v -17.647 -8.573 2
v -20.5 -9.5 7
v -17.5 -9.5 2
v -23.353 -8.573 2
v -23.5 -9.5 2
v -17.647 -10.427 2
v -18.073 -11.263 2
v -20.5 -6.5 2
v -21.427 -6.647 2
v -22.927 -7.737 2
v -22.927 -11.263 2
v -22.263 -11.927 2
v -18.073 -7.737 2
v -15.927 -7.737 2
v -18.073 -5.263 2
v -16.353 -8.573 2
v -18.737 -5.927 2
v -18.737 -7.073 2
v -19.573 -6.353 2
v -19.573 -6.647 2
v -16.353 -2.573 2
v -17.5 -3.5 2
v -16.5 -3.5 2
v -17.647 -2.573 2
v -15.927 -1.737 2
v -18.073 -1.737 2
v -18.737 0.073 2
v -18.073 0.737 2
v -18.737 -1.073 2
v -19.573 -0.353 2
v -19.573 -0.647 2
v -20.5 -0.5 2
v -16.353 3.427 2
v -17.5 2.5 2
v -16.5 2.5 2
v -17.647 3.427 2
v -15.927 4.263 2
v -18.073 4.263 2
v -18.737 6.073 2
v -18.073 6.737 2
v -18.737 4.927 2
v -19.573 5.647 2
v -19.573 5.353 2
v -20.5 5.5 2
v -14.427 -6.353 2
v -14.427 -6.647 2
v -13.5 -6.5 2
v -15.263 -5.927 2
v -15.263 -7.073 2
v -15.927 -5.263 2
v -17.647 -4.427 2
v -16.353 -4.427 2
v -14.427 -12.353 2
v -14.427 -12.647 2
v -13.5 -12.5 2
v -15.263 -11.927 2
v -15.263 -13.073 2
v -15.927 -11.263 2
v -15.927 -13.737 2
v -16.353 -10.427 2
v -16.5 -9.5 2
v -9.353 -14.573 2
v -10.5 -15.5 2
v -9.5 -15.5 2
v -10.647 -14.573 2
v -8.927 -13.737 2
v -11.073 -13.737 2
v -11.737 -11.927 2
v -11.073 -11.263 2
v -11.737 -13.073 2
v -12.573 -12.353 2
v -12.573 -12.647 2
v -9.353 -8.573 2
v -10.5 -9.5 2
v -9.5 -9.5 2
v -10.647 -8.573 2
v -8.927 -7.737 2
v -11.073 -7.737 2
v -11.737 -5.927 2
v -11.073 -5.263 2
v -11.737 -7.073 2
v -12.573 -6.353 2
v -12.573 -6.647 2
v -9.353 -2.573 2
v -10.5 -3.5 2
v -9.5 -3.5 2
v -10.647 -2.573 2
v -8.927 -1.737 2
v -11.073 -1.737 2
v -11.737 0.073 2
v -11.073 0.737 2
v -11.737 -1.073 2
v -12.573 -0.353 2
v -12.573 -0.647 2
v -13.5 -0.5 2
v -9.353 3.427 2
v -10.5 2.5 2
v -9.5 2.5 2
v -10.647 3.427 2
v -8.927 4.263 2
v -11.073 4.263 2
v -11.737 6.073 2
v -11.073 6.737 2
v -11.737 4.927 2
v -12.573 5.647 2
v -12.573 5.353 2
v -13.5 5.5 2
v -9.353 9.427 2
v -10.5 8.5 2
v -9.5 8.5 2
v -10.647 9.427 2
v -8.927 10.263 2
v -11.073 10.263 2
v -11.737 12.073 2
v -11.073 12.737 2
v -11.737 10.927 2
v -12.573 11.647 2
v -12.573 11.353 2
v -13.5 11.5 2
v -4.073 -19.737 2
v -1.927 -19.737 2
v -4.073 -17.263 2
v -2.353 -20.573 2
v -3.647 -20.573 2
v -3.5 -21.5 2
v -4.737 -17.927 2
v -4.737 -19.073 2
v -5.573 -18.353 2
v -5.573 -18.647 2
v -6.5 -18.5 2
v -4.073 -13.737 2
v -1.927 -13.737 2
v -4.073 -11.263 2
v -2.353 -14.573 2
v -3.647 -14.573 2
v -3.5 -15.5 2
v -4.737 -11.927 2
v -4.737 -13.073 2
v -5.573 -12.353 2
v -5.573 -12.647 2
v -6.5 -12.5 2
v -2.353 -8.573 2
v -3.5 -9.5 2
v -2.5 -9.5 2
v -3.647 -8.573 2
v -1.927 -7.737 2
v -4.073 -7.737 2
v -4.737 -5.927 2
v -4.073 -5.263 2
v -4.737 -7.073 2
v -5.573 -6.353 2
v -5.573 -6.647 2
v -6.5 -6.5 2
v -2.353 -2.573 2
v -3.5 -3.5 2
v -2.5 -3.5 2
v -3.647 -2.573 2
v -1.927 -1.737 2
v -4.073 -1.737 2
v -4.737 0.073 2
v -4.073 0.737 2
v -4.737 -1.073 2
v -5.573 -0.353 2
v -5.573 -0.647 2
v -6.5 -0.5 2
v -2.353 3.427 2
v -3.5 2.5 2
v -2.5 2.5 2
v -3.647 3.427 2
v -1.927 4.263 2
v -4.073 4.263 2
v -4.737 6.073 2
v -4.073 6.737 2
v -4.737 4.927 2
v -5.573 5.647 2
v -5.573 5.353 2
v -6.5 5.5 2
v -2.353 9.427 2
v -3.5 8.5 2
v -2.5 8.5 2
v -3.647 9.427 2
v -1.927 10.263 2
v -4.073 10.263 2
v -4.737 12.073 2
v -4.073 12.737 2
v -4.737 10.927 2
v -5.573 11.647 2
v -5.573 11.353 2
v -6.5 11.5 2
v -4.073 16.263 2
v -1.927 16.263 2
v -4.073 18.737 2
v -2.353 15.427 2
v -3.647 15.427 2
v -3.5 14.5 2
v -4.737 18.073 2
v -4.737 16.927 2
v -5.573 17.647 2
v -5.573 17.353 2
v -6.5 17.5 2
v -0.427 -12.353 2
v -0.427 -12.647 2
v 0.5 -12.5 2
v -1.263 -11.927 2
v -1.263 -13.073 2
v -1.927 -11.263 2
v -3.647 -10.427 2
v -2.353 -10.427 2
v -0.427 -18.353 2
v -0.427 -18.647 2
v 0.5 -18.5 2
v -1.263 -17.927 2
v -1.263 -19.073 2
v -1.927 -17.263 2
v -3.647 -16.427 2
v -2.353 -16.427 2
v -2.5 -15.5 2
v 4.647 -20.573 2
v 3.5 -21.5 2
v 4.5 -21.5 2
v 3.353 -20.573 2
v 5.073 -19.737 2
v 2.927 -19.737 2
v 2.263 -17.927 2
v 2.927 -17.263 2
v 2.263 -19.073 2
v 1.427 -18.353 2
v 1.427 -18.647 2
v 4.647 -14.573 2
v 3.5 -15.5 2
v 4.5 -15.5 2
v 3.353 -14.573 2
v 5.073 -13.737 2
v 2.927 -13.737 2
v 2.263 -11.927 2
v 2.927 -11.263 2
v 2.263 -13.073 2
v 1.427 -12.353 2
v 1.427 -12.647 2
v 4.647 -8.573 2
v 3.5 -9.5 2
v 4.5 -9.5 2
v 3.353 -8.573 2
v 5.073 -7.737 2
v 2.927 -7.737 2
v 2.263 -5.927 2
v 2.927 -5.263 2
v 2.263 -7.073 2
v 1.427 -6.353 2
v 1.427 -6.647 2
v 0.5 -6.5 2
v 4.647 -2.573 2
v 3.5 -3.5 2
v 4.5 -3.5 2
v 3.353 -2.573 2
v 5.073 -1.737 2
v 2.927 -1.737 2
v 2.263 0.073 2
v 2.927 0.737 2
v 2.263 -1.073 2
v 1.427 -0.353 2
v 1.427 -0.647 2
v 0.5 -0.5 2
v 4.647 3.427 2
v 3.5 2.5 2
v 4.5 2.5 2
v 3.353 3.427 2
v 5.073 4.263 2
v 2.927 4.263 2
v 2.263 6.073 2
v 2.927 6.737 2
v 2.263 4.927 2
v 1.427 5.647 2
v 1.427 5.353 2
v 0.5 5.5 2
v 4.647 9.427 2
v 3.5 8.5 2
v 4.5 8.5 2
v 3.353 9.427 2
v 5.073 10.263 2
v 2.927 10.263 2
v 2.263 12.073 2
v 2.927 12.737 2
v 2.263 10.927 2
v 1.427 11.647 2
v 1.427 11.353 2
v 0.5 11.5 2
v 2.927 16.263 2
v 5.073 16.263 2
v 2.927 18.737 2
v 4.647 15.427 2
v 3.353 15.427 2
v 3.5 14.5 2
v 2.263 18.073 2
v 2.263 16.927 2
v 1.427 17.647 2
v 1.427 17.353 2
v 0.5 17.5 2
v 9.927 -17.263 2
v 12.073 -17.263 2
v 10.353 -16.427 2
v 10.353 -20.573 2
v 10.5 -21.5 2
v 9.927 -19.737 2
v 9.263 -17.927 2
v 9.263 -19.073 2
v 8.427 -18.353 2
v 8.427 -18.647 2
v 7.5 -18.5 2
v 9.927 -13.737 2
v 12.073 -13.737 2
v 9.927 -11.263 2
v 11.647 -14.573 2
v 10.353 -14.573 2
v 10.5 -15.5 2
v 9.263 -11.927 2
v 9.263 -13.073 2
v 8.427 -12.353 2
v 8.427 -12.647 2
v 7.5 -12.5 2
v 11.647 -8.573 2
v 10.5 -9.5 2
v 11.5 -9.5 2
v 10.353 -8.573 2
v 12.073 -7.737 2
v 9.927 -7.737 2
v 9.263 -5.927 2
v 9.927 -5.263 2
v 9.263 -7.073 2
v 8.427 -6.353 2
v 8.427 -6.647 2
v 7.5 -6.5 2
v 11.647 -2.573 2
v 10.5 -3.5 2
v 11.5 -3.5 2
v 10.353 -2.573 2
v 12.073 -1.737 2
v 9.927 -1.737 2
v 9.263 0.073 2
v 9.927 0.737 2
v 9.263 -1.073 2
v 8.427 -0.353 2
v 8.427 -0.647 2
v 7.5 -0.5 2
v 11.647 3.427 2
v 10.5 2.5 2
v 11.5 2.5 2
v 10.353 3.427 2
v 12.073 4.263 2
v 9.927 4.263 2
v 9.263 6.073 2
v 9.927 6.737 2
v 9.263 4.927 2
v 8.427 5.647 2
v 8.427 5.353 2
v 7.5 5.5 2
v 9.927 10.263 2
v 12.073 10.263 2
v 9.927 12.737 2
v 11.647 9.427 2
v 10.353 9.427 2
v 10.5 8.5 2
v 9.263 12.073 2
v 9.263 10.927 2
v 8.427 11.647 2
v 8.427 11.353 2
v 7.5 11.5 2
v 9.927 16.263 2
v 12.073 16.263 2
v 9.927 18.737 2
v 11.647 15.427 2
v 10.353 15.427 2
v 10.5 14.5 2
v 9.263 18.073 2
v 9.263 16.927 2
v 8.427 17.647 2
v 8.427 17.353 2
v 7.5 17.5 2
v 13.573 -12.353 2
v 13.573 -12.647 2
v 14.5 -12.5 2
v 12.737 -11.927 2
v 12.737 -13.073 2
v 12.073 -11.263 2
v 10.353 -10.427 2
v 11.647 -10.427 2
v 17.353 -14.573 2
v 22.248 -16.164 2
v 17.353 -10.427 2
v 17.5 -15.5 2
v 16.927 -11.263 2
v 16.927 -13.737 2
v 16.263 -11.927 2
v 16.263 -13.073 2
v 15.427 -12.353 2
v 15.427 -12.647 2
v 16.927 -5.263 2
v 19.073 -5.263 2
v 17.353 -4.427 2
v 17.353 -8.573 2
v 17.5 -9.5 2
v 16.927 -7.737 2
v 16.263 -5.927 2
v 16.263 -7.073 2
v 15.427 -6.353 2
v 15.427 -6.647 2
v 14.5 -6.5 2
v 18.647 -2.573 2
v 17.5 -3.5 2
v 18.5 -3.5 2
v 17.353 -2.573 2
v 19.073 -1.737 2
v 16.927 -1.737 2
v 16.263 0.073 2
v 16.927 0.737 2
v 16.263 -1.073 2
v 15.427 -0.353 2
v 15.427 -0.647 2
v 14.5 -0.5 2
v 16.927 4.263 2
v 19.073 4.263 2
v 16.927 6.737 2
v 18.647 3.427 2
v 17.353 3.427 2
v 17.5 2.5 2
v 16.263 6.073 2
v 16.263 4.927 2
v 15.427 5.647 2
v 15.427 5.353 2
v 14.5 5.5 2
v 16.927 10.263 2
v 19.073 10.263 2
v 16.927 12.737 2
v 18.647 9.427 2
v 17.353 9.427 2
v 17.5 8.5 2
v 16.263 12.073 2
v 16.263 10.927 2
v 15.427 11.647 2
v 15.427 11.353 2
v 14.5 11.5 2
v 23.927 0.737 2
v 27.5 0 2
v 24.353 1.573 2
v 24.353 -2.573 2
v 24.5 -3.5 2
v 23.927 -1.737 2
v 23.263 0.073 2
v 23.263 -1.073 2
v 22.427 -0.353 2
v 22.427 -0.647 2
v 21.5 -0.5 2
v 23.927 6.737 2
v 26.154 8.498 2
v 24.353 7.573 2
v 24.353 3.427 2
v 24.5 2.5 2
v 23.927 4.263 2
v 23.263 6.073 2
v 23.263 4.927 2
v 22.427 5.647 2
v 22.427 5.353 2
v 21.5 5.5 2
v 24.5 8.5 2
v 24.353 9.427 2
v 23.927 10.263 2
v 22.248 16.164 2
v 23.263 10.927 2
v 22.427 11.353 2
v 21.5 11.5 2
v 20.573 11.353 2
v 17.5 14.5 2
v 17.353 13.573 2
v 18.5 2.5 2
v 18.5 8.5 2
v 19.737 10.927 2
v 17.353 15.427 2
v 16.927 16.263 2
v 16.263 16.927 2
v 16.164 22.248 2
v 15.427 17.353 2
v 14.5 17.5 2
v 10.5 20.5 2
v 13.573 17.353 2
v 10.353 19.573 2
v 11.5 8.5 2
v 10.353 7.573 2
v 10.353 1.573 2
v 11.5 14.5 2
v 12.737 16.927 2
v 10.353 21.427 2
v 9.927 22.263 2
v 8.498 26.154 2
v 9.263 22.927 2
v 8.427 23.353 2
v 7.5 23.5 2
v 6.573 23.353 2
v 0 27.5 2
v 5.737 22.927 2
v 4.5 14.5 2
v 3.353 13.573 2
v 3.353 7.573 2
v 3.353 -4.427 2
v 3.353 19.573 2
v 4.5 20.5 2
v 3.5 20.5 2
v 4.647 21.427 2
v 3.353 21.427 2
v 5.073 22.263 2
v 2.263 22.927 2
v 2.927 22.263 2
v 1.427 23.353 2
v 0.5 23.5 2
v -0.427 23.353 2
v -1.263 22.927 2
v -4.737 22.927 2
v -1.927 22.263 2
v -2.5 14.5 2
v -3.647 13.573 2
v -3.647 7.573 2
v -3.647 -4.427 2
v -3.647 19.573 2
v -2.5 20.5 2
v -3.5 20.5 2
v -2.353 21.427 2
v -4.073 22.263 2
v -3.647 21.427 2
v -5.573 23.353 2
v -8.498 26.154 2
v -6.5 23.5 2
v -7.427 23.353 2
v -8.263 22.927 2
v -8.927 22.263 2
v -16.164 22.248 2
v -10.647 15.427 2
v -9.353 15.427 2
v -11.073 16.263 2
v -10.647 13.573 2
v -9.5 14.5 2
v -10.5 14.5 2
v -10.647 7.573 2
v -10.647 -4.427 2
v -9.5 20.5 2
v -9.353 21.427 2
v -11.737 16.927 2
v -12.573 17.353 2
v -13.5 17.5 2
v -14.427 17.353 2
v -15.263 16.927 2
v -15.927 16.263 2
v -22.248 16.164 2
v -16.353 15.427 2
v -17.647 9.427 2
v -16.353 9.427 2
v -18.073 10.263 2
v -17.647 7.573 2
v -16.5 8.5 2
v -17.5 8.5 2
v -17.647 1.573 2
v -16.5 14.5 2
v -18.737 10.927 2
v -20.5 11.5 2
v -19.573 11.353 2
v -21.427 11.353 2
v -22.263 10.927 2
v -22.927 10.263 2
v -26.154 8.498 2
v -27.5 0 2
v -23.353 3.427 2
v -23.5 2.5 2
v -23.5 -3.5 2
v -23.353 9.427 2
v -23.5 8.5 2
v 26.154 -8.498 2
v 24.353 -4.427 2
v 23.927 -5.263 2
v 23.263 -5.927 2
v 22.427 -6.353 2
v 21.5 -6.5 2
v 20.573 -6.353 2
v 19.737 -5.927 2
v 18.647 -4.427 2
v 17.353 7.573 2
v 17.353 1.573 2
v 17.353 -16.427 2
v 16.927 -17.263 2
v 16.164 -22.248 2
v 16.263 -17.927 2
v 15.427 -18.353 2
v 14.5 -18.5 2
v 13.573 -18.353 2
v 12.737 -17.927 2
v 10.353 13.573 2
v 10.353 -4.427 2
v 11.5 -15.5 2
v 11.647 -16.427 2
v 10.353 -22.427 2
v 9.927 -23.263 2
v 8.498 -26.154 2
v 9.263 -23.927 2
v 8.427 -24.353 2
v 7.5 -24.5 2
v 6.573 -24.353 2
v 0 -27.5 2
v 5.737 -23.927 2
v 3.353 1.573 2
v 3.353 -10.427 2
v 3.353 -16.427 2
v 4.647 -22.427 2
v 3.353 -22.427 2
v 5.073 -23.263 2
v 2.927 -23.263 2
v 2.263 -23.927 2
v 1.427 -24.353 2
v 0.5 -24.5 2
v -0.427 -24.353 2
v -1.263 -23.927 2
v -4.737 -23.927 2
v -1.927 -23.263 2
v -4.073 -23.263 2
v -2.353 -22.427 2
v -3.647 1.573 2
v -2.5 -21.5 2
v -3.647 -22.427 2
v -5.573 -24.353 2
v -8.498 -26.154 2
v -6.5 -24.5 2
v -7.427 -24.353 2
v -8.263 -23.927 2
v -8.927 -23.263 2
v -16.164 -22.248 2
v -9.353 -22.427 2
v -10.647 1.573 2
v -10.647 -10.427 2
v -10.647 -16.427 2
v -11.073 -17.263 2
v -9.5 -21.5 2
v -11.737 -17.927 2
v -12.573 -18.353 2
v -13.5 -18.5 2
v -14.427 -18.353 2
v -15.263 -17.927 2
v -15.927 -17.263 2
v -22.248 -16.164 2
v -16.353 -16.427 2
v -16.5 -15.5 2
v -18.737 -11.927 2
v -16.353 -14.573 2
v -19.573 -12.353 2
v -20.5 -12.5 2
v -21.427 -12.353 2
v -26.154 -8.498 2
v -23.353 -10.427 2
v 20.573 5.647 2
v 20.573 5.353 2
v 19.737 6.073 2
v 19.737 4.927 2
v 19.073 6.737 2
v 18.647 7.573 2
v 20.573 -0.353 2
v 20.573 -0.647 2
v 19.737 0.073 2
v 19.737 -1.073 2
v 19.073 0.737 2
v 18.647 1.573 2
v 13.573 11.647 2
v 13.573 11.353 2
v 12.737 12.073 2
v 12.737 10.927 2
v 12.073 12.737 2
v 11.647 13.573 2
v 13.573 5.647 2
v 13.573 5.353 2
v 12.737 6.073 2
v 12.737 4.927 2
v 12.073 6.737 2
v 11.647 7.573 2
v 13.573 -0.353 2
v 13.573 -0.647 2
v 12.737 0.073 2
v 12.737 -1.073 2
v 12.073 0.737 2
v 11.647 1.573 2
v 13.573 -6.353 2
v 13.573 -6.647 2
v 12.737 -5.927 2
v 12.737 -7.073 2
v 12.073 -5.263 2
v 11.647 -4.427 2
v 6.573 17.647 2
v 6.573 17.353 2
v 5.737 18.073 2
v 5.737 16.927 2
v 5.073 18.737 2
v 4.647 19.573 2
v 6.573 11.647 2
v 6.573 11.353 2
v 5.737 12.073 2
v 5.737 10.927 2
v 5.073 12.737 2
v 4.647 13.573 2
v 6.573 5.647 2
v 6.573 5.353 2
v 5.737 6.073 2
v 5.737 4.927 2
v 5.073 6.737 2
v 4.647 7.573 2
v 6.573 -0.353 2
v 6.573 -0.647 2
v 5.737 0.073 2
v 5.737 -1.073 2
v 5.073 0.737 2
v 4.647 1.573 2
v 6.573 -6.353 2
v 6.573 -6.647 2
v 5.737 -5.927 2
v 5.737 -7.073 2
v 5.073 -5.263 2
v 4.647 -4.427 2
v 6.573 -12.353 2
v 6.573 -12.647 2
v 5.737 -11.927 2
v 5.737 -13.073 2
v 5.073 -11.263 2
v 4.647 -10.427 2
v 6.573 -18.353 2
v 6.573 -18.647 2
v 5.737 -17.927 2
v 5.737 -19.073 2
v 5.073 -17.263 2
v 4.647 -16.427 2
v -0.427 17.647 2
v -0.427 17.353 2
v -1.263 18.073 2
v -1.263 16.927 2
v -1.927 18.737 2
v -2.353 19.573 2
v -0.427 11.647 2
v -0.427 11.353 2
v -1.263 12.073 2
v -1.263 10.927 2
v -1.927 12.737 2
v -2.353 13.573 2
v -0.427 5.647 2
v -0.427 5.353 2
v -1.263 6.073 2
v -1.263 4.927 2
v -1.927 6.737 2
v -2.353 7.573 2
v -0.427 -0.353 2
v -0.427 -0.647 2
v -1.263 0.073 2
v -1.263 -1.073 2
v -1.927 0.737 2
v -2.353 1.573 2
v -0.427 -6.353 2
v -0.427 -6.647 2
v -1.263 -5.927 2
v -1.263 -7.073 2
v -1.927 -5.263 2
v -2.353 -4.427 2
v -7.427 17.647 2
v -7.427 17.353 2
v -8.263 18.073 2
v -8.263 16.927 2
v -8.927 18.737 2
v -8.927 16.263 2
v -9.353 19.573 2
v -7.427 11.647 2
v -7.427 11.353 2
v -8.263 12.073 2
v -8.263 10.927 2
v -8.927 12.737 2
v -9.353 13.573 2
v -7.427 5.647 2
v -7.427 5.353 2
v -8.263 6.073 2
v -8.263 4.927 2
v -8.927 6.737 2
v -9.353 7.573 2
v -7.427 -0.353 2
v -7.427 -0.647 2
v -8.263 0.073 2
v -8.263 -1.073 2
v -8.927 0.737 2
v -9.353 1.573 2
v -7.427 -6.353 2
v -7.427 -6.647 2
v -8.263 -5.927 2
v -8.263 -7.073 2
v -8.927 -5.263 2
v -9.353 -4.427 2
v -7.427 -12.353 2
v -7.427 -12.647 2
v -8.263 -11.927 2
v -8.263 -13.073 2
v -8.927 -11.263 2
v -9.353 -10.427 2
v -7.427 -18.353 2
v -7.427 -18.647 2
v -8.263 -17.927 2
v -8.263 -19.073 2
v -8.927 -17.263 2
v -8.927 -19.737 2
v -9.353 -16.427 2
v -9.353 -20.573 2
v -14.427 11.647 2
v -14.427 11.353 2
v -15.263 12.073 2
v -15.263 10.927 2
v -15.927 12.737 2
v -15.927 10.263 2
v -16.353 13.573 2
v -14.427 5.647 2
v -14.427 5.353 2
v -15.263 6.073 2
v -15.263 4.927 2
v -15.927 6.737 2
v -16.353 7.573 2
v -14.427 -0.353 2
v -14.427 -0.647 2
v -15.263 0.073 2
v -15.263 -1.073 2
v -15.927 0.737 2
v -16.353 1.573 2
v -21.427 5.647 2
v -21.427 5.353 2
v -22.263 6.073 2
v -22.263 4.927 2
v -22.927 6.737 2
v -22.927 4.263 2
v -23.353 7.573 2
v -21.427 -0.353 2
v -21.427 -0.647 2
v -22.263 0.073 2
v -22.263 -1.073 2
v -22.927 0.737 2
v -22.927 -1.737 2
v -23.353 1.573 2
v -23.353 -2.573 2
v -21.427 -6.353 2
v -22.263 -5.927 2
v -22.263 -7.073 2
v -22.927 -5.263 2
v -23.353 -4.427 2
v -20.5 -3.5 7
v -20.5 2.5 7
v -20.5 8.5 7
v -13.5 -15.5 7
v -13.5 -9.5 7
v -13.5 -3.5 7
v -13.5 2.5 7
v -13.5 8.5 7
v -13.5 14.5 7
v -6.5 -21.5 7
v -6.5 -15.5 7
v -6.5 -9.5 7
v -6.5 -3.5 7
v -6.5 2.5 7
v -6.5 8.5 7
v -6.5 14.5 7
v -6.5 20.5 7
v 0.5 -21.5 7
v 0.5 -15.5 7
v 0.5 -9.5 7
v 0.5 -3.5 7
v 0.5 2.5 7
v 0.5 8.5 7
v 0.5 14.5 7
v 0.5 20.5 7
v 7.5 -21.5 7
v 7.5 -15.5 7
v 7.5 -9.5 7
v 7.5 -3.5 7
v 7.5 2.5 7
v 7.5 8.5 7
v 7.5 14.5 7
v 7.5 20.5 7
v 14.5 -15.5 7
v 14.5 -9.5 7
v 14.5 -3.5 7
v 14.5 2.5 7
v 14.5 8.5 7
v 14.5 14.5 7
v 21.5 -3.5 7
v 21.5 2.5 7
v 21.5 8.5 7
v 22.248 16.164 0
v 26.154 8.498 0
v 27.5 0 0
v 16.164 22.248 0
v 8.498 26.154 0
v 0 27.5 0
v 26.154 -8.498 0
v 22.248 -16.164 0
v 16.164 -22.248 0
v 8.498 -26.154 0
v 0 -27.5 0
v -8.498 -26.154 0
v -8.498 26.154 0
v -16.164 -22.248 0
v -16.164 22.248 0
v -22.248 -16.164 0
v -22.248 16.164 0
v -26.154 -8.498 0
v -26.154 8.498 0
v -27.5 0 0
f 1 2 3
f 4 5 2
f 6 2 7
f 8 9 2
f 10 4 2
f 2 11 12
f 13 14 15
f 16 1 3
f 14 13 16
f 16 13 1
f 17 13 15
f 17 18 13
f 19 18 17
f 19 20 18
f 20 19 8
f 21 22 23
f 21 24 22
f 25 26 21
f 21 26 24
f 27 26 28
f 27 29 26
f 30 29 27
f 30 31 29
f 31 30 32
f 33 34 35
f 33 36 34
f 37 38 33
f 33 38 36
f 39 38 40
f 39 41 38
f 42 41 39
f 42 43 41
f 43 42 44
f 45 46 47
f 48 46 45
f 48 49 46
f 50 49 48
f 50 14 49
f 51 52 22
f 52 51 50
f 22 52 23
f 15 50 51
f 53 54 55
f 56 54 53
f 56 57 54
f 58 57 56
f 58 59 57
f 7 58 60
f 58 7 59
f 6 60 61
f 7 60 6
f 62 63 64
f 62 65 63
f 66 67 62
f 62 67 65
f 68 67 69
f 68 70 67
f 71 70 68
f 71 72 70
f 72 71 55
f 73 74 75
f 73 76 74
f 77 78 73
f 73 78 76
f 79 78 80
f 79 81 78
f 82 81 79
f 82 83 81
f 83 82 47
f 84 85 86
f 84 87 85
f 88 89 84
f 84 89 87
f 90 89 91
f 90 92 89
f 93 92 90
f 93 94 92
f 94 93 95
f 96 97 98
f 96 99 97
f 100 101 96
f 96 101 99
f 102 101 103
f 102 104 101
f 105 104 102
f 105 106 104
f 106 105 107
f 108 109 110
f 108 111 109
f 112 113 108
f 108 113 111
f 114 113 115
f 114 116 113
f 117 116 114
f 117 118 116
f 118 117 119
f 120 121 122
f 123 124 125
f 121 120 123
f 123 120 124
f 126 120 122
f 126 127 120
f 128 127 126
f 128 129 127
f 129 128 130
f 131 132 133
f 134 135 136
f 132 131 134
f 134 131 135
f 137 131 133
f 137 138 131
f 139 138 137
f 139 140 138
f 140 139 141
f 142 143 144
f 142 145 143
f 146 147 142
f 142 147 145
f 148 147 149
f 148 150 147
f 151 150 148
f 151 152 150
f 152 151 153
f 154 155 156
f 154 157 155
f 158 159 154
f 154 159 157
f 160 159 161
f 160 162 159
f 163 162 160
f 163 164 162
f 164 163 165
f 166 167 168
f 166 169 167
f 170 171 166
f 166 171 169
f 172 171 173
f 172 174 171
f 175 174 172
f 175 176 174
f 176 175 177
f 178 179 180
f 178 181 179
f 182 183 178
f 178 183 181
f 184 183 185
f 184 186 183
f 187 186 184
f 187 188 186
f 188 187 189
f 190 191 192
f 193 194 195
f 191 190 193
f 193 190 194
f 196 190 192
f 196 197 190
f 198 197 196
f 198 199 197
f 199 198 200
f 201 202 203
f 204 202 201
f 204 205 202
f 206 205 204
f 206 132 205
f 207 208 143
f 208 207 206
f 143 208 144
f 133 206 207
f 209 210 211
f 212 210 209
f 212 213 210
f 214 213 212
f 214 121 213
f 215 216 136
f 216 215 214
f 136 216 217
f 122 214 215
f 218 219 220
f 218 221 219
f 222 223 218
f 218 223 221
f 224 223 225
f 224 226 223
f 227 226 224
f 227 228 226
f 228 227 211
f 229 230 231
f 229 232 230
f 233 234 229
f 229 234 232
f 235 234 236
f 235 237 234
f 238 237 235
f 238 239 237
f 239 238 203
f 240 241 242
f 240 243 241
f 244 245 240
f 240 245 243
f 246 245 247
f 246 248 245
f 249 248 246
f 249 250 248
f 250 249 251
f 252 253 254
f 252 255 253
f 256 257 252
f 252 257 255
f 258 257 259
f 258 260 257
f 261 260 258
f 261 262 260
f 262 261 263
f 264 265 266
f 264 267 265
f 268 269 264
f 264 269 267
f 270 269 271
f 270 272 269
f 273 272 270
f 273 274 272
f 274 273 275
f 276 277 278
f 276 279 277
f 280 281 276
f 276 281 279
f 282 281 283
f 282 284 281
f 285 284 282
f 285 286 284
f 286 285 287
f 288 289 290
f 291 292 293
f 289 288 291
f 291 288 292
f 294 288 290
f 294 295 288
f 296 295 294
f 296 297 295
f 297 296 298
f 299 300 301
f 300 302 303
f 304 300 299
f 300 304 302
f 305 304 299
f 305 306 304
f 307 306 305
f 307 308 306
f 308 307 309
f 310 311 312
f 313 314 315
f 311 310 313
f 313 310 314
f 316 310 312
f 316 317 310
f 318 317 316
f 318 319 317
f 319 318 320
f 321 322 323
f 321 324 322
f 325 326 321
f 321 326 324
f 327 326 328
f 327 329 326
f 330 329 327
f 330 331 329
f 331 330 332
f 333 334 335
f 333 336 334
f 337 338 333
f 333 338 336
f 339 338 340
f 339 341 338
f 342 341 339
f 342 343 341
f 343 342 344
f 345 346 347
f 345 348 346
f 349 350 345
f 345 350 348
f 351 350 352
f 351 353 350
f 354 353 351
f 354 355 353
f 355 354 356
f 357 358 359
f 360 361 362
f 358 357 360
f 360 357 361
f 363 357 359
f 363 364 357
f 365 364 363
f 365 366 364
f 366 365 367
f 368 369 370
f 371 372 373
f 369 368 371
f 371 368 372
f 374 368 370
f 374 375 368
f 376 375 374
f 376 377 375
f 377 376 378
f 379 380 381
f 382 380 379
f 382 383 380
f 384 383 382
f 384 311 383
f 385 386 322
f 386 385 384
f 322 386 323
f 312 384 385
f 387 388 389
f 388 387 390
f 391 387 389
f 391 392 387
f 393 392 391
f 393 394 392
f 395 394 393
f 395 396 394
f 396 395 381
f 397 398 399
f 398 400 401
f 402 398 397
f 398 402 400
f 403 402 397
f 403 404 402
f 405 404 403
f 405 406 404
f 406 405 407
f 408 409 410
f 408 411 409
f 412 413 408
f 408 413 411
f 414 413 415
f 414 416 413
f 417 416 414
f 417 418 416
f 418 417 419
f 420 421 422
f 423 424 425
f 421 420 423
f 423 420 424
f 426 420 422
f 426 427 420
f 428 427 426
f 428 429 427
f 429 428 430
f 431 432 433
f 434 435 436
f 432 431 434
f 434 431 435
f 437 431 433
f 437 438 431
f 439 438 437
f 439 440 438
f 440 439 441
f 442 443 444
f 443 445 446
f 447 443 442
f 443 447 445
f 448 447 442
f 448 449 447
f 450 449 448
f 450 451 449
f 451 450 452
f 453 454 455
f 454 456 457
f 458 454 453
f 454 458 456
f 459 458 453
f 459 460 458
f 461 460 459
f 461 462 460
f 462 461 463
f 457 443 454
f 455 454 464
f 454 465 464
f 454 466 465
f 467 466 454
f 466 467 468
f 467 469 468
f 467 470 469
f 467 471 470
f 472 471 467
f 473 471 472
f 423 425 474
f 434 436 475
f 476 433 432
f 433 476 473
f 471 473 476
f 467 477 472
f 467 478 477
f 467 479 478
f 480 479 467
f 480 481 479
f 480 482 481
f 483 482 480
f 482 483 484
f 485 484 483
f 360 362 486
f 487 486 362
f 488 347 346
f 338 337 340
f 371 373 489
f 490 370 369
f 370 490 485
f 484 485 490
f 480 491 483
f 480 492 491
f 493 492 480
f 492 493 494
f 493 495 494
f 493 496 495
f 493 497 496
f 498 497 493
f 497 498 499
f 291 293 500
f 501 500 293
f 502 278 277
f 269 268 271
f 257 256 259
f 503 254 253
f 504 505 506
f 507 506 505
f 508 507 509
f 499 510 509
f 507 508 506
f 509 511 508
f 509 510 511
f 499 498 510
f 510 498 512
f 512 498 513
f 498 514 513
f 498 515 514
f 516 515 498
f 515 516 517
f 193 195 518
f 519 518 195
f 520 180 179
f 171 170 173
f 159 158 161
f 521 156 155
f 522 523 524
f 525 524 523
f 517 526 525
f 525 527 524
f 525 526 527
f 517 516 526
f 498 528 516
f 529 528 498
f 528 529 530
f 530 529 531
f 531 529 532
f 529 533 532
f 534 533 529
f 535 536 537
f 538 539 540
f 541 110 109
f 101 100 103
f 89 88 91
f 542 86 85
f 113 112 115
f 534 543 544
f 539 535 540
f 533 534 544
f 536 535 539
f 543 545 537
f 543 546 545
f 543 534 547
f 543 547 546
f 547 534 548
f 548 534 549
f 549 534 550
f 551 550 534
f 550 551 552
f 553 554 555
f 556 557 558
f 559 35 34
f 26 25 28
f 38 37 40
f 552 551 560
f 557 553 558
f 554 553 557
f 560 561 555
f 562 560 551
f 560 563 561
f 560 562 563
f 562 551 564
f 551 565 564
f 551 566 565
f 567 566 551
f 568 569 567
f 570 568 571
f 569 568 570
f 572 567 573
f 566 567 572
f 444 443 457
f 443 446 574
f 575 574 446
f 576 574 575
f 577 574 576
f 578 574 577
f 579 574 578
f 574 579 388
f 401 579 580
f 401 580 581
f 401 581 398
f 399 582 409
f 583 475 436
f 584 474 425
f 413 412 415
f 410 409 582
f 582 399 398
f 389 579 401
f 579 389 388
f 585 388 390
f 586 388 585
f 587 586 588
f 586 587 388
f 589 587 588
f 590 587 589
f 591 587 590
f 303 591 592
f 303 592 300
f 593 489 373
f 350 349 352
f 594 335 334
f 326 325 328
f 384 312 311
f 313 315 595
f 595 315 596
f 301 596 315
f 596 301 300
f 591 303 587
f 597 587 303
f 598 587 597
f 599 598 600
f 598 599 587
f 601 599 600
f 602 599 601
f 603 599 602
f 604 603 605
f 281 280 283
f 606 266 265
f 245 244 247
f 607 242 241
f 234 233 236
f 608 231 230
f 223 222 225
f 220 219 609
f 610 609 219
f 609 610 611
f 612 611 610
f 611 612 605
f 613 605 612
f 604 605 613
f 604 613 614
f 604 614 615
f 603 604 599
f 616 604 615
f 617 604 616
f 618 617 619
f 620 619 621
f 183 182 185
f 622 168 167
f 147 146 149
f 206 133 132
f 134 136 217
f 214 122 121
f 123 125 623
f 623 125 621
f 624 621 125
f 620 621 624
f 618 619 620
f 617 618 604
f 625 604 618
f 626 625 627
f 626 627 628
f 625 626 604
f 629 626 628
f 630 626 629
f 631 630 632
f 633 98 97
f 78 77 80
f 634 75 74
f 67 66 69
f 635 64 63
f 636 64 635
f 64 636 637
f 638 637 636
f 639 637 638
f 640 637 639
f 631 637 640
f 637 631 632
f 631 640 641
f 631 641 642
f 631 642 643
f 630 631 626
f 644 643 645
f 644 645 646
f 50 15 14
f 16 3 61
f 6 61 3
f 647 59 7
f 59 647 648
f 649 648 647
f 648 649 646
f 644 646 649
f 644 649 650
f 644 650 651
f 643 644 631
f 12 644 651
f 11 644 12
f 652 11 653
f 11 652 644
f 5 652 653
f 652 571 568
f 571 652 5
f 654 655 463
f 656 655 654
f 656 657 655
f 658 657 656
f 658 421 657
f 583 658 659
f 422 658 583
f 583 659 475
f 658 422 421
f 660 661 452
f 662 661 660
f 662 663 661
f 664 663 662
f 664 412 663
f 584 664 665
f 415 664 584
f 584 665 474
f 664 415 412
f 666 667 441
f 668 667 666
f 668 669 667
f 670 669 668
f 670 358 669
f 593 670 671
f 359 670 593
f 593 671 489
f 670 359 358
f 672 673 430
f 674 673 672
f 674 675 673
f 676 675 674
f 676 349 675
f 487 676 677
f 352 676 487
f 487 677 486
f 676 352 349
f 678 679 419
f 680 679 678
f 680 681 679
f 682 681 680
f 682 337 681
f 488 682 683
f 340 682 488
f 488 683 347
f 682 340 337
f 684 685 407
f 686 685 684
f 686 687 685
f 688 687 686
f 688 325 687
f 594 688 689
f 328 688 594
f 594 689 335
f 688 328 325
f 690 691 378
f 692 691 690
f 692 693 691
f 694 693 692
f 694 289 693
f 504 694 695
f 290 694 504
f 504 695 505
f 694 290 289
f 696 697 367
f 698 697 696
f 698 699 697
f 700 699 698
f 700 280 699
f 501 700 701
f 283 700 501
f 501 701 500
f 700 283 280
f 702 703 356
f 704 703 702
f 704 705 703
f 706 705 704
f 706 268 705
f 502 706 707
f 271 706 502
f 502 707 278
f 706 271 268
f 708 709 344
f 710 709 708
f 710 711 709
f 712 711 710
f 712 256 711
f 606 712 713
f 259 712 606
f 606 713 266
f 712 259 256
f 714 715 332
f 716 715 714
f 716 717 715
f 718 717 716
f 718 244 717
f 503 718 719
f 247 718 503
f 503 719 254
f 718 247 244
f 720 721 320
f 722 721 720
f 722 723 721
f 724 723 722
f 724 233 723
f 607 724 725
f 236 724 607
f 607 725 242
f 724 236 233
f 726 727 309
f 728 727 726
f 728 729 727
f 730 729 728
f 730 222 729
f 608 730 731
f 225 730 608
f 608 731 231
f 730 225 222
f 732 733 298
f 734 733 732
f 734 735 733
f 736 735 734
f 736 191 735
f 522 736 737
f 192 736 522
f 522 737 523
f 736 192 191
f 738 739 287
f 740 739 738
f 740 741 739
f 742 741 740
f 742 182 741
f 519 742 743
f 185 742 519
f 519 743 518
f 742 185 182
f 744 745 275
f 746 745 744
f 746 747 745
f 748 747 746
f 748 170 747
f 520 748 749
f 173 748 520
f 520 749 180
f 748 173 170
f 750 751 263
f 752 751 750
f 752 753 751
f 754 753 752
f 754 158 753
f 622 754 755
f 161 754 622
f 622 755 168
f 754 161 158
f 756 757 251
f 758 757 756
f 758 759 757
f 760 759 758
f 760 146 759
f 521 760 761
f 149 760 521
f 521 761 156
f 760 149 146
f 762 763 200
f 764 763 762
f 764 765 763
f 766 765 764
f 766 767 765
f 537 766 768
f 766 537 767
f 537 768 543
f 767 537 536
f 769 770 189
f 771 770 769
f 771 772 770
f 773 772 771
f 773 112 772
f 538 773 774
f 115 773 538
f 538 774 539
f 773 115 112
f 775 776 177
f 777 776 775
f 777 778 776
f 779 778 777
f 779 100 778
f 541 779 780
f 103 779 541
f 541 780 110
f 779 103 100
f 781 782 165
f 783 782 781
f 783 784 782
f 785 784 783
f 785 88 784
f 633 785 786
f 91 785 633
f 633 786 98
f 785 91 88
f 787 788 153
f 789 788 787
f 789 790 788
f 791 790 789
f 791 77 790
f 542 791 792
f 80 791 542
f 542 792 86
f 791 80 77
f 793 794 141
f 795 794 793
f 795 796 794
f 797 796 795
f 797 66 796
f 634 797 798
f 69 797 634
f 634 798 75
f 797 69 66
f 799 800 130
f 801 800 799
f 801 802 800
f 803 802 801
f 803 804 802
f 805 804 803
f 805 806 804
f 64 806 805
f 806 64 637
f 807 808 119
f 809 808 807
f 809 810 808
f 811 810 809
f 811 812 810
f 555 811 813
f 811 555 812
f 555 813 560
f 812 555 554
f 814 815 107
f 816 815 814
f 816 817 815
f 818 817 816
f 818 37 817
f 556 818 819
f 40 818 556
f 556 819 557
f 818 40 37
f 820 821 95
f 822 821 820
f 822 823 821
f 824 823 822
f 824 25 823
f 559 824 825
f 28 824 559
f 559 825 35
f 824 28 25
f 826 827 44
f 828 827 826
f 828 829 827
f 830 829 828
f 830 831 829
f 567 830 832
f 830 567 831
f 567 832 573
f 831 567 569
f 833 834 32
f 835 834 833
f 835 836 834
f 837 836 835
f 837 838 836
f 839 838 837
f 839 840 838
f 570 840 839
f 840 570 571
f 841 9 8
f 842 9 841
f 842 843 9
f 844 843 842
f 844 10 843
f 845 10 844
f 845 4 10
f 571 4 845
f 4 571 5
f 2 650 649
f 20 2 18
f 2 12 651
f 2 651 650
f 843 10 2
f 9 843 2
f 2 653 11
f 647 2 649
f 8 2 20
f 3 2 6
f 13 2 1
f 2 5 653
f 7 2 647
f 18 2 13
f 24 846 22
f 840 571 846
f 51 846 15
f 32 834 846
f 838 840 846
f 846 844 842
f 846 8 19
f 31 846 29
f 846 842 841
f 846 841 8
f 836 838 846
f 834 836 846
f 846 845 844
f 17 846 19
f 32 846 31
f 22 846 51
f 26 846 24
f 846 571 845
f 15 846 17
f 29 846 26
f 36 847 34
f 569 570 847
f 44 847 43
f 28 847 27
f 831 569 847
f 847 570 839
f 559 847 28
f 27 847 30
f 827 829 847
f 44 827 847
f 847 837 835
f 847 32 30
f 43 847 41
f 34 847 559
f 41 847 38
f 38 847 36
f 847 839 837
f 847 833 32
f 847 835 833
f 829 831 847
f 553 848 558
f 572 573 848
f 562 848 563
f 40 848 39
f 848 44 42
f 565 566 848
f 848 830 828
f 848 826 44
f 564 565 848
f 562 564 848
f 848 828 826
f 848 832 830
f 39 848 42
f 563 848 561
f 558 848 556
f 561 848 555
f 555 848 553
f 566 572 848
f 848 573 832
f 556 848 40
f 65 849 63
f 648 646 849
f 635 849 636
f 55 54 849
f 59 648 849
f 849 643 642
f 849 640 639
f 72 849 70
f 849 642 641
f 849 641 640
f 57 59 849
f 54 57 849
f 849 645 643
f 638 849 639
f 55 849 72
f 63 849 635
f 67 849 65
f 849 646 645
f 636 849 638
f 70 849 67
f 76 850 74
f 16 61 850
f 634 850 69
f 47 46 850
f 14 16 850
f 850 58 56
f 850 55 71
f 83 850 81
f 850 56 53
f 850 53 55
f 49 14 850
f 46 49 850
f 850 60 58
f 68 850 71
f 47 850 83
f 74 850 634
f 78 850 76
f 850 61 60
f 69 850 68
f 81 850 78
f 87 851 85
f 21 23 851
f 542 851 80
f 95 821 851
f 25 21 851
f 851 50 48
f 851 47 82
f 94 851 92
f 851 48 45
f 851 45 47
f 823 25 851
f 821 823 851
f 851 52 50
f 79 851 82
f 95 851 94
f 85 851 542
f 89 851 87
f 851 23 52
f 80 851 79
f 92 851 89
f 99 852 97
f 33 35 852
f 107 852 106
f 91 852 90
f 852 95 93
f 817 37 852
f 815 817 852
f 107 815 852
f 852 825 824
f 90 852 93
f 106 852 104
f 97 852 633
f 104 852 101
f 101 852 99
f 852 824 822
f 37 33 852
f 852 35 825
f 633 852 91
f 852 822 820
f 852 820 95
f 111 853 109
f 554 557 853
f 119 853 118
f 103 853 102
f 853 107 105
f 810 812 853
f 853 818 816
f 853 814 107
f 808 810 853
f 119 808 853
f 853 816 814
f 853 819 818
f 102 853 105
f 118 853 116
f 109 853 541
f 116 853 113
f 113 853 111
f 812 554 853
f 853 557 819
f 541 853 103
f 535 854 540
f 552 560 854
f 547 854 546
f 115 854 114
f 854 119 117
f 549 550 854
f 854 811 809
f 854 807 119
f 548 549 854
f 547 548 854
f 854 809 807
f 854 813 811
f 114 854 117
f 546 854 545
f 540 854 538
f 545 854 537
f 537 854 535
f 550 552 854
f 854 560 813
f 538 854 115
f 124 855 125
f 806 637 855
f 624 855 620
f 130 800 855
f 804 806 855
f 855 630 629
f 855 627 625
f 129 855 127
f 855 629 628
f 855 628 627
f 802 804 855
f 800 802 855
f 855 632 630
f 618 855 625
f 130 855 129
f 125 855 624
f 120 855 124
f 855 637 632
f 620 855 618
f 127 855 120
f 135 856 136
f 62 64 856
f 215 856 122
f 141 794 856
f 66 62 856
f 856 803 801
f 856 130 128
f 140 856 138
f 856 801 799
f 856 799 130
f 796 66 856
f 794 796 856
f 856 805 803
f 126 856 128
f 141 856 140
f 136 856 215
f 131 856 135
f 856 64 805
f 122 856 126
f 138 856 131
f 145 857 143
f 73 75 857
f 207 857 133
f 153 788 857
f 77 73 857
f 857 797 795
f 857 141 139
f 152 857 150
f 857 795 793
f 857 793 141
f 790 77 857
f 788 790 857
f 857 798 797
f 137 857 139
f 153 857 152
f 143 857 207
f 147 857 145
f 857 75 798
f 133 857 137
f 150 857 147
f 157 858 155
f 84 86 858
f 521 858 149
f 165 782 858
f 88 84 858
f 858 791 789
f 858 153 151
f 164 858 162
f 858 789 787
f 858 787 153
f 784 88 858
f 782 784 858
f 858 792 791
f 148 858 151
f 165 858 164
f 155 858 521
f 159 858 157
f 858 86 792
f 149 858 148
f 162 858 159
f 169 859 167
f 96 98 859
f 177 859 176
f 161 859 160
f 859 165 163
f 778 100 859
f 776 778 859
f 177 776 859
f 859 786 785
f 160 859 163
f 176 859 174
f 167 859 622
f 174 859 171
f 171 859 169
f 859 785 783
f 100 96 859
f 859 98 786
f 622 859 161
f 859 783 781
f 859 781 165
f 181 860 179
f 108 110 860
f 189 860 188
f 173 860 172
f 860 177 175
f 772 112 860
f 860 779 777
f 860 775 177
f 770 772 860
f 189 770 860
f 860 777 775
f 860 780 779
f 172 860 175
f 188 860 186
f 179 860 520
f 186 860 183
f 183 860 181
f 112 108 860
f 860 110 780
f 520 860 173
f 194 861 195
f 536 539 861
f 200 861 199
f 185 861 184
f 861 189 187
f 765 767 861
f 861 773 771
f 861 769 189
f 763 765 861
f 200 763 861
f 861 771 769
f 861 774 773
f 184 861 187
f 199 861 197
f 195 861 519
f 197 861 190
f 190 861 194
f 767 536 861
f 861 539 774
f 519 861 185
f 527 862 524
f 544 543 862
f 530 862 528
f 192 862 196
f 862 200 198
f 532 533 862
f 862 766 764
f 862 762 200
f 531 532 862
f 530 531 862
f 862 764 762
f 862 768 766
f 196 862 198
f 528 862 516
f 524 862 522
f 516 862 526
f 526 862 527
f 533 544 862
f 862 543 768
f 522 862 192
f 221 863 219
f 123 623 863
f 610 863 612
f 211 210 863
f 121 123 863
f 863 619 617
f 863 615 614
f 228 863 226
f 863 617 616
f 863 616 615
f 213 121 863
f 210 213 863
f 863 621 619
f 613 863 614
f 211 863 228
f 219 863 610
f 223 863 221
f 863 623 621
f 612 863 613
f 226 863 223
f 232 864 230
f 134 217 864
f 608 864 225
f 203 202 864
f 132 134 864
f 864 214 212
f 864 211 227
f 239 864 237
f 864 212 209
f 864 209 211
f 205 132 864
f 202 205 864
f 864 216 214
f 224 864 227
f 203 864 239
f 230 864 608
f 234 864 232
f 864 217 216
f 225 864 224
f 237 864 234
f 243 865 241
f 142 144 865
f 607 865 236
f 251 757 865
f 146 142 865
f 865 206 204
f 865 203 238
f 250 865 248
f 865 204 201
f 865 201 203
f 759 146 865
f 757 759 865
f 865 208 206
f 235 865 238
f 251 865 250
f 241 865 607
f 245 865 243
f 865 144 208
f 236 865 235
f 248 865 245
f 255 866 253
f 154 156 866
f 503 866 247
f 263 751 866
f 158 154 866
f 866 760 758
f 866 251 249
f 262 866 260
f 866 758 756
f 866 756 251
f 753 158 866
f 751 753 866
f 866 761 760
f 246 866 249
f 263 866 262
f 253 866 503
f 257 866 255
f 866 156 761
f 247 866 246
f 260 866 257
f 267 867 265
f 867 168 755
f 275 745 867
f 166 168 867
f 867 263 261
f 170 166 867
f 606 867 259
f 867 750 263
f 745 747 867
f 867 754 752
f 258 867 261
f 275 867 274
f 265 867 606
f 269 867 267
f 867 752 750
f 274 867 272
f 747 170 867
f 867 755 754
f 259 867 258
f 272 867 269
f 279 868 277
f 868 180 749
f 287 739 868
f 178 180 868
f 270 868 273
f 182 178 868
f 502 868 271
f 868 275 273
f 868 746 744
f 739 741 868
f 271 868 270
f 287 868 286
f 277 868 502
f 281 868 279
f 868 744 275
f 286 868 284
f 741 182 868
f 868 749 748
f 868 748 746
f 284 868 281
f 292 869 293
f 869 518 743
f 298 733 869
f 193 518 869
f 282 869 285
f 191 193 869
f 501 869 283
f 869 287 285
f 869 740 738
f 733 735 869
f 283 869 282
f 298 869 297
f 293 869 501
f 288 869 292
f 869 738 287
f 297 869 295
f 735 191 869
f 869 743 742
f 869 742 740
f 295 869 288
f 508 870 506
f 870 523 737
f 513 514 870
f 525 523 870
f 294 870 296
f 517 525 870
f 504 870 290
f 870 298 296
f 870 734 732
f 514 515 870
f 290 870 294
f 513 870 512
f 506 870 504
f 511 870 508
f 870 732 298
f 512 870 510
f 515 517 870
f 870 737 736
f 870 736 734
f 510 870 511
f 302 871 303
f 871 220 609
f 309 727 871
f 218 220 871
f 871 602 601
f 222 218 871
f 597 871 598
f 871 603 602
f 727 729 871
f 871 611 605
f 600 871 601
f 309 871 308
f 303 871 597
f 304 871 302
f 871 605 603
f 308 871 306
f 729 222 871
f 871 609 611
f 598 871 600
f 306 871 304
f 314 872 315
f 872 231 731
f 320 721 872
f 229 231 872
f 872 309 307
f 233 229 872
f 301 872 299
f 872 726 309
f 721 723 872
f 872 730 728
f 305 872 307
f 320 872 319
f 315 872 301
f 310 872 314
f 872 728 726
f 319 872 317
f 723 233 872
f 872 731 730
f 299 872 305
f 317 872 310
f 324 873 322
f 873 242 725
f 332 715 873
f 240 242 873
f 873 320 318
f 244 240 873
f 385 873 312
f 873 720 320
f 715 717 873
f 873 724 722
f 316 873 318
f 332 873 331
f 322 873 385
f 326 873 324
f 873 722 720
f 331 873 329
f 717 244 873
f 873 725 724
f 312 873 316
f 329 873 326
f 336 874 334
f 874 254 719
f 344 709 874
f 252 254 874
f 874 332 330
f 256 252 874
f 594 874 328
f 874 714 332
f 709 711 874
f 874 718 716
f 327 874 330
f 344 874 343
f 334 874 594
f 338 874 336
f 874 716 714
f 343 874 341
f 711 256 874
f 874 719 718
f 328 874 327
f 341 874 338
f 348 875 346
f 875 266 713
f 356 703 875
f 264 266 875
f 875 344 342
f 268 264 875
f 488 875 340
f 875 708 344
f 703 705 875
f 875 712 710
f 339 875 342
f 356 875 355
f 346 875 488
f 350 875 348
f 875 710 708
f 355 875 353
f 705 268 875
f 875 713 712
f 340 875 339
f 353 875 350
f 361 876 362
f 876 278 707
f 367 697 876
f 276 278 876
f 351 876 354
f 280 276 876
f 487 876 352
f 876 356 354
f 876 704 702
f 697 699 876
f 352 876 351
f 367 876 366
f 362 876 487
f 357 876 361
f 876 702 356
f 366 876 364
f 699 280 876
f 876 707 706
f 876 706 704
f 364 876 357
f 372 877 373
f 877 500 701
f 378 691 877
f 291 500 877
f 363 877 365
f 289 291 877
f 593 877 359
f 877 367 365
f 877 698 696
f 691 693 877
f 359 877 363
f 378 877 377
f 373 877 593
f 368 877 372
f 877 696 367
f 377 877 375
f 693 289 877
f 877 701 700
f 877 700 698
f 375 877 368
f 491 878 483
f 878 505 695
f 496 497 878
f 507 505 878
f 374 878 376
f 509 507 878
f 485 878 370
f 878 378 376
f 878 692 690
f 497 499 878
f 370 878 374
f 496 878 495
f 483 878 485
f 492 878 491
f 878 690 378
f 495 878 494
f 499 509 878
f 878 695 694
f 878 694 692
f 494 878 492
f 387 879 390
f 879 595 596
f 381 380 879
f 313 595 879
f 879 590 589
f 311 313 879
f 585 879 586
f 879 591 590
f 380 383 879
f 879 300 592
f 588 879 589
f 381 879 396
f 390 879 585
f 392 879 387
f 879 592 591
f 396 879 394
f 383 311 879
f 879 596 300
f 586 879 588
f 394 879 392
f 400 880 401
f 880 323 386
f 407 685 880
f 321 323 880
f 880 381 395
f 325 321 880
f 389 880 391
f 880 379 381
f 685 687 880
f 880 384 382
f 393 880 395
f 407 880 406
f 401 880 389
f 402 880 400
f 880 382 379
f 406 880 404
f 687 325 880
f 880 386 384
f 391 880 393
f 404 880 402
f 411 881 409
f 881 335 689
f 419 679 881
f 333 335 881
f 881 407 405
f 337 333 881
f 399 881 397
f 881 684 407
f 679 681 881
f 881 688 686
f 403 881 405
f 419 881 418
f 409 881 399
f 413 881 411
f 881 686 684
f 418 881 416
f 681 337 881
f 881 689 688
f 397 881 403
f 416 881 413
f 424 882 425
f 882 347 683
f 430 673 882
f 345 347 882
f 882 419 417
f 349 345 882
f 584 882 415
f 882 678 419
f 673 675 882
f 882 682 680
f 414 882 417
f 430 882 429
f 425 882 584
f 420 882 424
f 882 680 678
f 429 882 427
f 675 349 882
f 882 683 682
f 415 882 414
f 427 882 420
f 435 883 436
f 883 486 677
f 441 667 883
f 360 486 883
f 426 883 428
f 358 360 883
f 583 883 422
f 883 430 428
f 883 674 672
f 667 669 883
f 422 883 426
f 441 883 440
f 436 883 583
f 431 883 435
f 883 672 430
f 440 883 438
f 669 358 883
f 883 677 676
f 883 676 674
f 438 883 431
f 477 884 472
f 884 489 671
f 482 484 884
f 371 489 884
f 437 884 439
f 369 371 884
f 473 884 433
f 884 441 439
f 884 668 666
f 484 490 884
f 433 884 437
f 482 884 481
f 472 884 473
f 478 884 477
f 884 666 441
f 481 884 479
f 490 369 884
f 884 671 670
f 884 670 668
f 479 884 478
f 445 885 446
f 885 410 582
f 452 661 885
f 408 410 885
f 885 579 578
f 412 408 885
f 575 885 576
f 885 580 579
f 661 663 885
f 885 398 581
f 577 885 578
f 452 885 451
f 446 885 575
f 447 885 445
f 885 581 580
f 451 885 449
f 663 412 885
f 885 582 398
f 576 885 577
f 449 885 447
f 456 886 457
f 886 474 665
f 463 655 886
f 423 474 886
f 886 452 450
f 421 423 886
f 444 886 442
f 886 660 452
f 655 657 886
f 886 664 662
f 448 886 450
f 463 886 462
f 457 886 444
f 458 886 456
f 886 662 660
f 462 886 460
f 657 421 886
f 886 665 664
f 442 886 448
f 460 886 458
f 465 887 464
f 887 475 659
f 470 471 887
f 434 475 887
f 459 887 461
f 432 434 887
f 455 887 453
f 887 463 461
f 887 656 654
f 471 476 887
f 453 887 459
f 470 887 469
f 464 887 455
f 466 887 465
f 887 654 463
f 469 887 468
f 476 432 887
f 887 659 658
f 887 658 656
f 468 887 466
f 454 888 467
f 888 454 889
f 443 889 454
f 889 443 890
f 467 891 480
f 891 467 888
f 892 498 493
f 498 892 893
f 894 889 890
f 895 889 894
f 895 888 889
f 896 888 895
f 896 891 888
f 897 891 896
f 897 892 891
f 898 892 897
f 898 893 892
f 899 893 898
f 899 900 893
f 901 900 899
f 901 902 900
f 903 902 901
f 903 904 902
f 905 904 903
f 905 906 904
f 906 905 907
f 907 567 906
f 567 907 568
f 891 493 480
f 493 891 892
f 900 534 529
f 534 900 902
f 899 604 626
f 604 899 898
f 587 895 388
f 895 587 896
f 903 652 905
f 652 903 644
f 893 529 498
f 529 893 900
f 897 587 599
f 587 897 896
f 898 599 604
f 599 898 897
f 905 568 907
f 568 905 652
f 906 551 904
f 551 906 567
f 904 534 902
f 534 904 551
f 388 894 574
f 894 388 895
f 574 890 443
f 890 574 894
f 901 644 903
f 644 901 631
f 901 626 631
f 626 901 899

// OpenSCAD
$fn=20;

module pad()
{
    diameter = 50;
    z = 7.5;
    leg_support_diameter = 20;
    leg_support_length = 20;
    leg_void_diameter = 16;
    leg_angle = 15;
    
    difference()
    {
        union()
        {
            // the pad itself
//            translate([0, 0, -10])
            cylinder(d=diameter,h=z);
            
            // leg support
            rotate([-leg_angle, 0, 0])
            translate([0, 0, z/2])
            cylinder(d=leg_support_diameter, h=leg_support_length);
        }
        union()
        {
            rotate([-leg_angle, 0, 0])
            translate([0, 0, z/2])
            cylinder(d=leg_void_diameter, h=leg_support_length + 1);
            
            for( x_translation = [15, -15] )
            {
                translate([x_translation, 0, z ])
                rotate([180, 0, 0])
                {
                    // threaded insert
                    cylinder(d=4, h=6);
                    
                    // screw void
                    cylinder(d=3.2, h=10);
                }
            }
        }
    }
}

module spike_pad_linear()
{
    diameter = 55;
    z = 2;
    cone_diameter = 6;
    cone_height = 5;
    
    cylinder(d=diameter, h=z);
    translate([0, 0, z])
//    cylinder(h=cone_height, d1=cone_diameter, d2=0);
    for(x_translation = [ -diameter/2 : cone_diameter+1 : diameter/2 ] )
    {
        for(y_translation = [ -diameter/2 : cone_diameter : diameter/2 ] )
        {
            if( sqrt( x_translation*x_translation + y_translation*y_translation) < diameter/2 - cone_diameter/2 - 1)
            {
            translate([x_translation, y_translation, 0])
            cylinder(h=cone_height, d1=cone_diameter, d2=0);
            }
        }
    }
}

module spike_pad_radial()
{
    diameter = 55;
    z = 2;
    cone_diameter = 6;
    cone_height = 5;
    
    cylinder(d=diameter, h=z);
    translate([0, 0, z])
//    cylinder(h=cone_height, d1=cone_diameter, d2=0);
    for(x_translation = [ -diameter/2 : cone_diameter+1 : diameter/2 ] )
    {
        for(y_translation = [ -diameter/2 : cone_diameter : diameter/2 ] )
        {
            if( sqrt( x_translation*x_translation + y_translation*y_translation) < diameter/2 - cone_diameter/2 - 1)
            {
            translate([x_translation, y_translation, 0])
            cylinder(h=cone_height, d1=cone_diameter, d2=0);
            }
        }
    }
}

//pad();

spike_pad_radial();
